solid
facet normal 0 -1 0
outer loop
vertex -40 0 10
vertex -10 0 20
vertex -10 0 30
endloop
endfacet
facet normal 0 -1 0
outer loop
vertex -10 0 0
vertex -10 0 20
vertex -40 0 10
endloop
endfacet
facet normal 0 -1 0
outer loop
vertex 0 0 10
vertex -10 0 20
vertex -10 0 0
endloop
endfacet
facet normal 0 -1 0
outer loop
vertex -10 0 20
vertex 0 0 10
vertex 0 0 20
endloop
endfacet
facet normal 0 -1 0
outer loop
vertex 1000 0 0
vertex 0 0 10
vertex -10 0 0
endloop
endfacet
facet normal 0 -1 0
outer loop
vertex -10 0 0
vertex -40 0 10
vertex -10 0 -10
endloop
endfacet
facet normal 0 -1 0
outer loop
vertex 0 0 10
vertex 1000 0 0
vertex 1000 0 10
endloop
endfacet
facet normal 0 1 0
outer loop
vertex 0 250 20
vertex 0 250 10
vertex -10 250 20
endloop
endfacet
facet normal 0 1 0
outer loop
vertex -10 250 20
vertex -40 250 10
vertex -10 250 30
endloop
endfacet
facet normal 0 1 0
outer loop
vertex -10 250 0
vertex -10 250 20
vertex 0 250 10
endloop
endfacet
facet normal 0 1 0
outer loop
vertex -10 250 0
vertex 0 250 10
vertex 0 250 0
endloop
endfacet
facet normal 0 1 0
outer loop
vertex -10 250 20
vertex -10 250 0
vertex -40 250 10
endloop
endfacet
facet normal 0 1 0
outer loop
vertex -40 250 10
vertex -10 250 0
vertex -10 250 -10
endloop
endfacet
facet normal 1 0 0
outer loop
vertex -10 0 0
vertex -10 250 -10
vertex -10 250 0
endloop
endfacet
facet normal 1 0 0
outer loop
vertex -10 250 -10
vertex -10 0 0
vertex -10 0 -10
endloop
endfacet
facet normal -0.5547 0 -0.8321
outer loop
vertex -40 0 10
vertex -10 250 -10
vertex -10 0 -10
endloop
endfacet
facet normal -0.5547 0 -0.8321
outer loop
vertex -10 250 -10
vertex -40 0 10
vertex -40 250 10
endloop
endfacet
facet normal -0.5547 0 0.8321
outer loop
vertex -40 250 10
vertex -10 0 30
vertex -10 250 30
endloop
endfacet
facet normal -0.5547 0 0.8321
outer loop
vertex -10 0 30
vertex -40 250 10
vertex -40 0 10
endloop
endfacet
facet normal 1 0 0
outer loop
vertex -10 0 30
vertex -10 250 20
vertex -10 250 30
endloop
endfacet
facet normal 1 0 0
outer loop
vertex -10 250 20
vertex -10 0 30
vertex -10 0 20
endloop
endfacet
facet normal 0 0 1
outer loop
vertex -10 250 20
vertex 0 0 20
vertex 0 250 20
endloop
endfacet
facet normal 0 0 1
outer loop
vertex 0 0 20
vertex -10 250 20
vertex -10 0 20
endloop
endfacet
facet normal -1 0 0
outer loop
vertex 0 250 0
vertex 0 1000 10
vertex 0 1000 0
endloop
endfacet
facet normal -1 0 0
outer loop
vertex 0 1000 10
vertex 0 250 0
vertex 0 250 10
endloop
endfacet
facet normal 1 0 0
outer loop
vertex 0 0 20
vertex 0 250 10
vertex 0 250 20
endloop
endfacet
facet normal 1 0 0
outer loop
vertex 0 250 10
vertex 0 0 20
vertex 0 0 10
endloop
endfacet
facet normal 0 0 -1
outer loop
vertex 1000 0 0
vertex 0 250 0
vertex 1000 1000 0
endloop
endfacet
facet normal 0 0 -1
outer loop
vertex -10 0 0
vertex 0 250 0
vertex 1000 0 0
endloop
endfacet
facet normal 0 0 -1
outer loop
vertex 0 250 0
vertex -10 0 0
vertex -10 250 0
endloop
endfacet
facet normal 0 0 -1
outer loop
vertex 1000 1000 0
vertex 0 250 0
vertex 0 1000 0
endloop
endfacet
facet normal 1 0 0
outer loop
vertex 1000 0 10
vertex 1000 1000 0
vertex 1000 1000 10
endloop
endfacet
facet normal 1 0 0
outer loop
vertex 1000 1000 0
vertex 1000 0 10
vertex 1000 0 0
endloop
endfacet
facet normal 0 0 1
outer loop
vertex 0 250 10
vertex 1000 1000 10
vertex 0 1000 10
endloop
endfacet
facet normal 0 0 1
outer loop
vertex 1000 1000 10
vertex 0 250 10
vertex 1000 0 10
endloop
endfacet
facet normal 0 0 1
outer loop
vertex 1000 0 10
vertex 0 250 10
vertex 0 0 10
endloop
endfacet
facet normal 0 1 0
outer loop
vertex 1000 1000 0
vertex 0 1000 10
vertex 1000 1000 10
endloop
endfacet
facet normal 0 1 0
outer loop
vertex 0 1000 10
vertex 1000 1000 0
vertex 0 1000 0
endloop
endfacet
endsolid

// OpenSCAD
*translate([0, 0, 10]) cube([100, 100, 1]);

translate([0,0,30]) rotate([0,90,90]) {
    linear_extrude(250) {
        polygon(points=[[10,0],[10,10],[0,10],[20,40],[40,10],[30,10],[30,0]]);
    }
}

cube([1000,1000,10]);
